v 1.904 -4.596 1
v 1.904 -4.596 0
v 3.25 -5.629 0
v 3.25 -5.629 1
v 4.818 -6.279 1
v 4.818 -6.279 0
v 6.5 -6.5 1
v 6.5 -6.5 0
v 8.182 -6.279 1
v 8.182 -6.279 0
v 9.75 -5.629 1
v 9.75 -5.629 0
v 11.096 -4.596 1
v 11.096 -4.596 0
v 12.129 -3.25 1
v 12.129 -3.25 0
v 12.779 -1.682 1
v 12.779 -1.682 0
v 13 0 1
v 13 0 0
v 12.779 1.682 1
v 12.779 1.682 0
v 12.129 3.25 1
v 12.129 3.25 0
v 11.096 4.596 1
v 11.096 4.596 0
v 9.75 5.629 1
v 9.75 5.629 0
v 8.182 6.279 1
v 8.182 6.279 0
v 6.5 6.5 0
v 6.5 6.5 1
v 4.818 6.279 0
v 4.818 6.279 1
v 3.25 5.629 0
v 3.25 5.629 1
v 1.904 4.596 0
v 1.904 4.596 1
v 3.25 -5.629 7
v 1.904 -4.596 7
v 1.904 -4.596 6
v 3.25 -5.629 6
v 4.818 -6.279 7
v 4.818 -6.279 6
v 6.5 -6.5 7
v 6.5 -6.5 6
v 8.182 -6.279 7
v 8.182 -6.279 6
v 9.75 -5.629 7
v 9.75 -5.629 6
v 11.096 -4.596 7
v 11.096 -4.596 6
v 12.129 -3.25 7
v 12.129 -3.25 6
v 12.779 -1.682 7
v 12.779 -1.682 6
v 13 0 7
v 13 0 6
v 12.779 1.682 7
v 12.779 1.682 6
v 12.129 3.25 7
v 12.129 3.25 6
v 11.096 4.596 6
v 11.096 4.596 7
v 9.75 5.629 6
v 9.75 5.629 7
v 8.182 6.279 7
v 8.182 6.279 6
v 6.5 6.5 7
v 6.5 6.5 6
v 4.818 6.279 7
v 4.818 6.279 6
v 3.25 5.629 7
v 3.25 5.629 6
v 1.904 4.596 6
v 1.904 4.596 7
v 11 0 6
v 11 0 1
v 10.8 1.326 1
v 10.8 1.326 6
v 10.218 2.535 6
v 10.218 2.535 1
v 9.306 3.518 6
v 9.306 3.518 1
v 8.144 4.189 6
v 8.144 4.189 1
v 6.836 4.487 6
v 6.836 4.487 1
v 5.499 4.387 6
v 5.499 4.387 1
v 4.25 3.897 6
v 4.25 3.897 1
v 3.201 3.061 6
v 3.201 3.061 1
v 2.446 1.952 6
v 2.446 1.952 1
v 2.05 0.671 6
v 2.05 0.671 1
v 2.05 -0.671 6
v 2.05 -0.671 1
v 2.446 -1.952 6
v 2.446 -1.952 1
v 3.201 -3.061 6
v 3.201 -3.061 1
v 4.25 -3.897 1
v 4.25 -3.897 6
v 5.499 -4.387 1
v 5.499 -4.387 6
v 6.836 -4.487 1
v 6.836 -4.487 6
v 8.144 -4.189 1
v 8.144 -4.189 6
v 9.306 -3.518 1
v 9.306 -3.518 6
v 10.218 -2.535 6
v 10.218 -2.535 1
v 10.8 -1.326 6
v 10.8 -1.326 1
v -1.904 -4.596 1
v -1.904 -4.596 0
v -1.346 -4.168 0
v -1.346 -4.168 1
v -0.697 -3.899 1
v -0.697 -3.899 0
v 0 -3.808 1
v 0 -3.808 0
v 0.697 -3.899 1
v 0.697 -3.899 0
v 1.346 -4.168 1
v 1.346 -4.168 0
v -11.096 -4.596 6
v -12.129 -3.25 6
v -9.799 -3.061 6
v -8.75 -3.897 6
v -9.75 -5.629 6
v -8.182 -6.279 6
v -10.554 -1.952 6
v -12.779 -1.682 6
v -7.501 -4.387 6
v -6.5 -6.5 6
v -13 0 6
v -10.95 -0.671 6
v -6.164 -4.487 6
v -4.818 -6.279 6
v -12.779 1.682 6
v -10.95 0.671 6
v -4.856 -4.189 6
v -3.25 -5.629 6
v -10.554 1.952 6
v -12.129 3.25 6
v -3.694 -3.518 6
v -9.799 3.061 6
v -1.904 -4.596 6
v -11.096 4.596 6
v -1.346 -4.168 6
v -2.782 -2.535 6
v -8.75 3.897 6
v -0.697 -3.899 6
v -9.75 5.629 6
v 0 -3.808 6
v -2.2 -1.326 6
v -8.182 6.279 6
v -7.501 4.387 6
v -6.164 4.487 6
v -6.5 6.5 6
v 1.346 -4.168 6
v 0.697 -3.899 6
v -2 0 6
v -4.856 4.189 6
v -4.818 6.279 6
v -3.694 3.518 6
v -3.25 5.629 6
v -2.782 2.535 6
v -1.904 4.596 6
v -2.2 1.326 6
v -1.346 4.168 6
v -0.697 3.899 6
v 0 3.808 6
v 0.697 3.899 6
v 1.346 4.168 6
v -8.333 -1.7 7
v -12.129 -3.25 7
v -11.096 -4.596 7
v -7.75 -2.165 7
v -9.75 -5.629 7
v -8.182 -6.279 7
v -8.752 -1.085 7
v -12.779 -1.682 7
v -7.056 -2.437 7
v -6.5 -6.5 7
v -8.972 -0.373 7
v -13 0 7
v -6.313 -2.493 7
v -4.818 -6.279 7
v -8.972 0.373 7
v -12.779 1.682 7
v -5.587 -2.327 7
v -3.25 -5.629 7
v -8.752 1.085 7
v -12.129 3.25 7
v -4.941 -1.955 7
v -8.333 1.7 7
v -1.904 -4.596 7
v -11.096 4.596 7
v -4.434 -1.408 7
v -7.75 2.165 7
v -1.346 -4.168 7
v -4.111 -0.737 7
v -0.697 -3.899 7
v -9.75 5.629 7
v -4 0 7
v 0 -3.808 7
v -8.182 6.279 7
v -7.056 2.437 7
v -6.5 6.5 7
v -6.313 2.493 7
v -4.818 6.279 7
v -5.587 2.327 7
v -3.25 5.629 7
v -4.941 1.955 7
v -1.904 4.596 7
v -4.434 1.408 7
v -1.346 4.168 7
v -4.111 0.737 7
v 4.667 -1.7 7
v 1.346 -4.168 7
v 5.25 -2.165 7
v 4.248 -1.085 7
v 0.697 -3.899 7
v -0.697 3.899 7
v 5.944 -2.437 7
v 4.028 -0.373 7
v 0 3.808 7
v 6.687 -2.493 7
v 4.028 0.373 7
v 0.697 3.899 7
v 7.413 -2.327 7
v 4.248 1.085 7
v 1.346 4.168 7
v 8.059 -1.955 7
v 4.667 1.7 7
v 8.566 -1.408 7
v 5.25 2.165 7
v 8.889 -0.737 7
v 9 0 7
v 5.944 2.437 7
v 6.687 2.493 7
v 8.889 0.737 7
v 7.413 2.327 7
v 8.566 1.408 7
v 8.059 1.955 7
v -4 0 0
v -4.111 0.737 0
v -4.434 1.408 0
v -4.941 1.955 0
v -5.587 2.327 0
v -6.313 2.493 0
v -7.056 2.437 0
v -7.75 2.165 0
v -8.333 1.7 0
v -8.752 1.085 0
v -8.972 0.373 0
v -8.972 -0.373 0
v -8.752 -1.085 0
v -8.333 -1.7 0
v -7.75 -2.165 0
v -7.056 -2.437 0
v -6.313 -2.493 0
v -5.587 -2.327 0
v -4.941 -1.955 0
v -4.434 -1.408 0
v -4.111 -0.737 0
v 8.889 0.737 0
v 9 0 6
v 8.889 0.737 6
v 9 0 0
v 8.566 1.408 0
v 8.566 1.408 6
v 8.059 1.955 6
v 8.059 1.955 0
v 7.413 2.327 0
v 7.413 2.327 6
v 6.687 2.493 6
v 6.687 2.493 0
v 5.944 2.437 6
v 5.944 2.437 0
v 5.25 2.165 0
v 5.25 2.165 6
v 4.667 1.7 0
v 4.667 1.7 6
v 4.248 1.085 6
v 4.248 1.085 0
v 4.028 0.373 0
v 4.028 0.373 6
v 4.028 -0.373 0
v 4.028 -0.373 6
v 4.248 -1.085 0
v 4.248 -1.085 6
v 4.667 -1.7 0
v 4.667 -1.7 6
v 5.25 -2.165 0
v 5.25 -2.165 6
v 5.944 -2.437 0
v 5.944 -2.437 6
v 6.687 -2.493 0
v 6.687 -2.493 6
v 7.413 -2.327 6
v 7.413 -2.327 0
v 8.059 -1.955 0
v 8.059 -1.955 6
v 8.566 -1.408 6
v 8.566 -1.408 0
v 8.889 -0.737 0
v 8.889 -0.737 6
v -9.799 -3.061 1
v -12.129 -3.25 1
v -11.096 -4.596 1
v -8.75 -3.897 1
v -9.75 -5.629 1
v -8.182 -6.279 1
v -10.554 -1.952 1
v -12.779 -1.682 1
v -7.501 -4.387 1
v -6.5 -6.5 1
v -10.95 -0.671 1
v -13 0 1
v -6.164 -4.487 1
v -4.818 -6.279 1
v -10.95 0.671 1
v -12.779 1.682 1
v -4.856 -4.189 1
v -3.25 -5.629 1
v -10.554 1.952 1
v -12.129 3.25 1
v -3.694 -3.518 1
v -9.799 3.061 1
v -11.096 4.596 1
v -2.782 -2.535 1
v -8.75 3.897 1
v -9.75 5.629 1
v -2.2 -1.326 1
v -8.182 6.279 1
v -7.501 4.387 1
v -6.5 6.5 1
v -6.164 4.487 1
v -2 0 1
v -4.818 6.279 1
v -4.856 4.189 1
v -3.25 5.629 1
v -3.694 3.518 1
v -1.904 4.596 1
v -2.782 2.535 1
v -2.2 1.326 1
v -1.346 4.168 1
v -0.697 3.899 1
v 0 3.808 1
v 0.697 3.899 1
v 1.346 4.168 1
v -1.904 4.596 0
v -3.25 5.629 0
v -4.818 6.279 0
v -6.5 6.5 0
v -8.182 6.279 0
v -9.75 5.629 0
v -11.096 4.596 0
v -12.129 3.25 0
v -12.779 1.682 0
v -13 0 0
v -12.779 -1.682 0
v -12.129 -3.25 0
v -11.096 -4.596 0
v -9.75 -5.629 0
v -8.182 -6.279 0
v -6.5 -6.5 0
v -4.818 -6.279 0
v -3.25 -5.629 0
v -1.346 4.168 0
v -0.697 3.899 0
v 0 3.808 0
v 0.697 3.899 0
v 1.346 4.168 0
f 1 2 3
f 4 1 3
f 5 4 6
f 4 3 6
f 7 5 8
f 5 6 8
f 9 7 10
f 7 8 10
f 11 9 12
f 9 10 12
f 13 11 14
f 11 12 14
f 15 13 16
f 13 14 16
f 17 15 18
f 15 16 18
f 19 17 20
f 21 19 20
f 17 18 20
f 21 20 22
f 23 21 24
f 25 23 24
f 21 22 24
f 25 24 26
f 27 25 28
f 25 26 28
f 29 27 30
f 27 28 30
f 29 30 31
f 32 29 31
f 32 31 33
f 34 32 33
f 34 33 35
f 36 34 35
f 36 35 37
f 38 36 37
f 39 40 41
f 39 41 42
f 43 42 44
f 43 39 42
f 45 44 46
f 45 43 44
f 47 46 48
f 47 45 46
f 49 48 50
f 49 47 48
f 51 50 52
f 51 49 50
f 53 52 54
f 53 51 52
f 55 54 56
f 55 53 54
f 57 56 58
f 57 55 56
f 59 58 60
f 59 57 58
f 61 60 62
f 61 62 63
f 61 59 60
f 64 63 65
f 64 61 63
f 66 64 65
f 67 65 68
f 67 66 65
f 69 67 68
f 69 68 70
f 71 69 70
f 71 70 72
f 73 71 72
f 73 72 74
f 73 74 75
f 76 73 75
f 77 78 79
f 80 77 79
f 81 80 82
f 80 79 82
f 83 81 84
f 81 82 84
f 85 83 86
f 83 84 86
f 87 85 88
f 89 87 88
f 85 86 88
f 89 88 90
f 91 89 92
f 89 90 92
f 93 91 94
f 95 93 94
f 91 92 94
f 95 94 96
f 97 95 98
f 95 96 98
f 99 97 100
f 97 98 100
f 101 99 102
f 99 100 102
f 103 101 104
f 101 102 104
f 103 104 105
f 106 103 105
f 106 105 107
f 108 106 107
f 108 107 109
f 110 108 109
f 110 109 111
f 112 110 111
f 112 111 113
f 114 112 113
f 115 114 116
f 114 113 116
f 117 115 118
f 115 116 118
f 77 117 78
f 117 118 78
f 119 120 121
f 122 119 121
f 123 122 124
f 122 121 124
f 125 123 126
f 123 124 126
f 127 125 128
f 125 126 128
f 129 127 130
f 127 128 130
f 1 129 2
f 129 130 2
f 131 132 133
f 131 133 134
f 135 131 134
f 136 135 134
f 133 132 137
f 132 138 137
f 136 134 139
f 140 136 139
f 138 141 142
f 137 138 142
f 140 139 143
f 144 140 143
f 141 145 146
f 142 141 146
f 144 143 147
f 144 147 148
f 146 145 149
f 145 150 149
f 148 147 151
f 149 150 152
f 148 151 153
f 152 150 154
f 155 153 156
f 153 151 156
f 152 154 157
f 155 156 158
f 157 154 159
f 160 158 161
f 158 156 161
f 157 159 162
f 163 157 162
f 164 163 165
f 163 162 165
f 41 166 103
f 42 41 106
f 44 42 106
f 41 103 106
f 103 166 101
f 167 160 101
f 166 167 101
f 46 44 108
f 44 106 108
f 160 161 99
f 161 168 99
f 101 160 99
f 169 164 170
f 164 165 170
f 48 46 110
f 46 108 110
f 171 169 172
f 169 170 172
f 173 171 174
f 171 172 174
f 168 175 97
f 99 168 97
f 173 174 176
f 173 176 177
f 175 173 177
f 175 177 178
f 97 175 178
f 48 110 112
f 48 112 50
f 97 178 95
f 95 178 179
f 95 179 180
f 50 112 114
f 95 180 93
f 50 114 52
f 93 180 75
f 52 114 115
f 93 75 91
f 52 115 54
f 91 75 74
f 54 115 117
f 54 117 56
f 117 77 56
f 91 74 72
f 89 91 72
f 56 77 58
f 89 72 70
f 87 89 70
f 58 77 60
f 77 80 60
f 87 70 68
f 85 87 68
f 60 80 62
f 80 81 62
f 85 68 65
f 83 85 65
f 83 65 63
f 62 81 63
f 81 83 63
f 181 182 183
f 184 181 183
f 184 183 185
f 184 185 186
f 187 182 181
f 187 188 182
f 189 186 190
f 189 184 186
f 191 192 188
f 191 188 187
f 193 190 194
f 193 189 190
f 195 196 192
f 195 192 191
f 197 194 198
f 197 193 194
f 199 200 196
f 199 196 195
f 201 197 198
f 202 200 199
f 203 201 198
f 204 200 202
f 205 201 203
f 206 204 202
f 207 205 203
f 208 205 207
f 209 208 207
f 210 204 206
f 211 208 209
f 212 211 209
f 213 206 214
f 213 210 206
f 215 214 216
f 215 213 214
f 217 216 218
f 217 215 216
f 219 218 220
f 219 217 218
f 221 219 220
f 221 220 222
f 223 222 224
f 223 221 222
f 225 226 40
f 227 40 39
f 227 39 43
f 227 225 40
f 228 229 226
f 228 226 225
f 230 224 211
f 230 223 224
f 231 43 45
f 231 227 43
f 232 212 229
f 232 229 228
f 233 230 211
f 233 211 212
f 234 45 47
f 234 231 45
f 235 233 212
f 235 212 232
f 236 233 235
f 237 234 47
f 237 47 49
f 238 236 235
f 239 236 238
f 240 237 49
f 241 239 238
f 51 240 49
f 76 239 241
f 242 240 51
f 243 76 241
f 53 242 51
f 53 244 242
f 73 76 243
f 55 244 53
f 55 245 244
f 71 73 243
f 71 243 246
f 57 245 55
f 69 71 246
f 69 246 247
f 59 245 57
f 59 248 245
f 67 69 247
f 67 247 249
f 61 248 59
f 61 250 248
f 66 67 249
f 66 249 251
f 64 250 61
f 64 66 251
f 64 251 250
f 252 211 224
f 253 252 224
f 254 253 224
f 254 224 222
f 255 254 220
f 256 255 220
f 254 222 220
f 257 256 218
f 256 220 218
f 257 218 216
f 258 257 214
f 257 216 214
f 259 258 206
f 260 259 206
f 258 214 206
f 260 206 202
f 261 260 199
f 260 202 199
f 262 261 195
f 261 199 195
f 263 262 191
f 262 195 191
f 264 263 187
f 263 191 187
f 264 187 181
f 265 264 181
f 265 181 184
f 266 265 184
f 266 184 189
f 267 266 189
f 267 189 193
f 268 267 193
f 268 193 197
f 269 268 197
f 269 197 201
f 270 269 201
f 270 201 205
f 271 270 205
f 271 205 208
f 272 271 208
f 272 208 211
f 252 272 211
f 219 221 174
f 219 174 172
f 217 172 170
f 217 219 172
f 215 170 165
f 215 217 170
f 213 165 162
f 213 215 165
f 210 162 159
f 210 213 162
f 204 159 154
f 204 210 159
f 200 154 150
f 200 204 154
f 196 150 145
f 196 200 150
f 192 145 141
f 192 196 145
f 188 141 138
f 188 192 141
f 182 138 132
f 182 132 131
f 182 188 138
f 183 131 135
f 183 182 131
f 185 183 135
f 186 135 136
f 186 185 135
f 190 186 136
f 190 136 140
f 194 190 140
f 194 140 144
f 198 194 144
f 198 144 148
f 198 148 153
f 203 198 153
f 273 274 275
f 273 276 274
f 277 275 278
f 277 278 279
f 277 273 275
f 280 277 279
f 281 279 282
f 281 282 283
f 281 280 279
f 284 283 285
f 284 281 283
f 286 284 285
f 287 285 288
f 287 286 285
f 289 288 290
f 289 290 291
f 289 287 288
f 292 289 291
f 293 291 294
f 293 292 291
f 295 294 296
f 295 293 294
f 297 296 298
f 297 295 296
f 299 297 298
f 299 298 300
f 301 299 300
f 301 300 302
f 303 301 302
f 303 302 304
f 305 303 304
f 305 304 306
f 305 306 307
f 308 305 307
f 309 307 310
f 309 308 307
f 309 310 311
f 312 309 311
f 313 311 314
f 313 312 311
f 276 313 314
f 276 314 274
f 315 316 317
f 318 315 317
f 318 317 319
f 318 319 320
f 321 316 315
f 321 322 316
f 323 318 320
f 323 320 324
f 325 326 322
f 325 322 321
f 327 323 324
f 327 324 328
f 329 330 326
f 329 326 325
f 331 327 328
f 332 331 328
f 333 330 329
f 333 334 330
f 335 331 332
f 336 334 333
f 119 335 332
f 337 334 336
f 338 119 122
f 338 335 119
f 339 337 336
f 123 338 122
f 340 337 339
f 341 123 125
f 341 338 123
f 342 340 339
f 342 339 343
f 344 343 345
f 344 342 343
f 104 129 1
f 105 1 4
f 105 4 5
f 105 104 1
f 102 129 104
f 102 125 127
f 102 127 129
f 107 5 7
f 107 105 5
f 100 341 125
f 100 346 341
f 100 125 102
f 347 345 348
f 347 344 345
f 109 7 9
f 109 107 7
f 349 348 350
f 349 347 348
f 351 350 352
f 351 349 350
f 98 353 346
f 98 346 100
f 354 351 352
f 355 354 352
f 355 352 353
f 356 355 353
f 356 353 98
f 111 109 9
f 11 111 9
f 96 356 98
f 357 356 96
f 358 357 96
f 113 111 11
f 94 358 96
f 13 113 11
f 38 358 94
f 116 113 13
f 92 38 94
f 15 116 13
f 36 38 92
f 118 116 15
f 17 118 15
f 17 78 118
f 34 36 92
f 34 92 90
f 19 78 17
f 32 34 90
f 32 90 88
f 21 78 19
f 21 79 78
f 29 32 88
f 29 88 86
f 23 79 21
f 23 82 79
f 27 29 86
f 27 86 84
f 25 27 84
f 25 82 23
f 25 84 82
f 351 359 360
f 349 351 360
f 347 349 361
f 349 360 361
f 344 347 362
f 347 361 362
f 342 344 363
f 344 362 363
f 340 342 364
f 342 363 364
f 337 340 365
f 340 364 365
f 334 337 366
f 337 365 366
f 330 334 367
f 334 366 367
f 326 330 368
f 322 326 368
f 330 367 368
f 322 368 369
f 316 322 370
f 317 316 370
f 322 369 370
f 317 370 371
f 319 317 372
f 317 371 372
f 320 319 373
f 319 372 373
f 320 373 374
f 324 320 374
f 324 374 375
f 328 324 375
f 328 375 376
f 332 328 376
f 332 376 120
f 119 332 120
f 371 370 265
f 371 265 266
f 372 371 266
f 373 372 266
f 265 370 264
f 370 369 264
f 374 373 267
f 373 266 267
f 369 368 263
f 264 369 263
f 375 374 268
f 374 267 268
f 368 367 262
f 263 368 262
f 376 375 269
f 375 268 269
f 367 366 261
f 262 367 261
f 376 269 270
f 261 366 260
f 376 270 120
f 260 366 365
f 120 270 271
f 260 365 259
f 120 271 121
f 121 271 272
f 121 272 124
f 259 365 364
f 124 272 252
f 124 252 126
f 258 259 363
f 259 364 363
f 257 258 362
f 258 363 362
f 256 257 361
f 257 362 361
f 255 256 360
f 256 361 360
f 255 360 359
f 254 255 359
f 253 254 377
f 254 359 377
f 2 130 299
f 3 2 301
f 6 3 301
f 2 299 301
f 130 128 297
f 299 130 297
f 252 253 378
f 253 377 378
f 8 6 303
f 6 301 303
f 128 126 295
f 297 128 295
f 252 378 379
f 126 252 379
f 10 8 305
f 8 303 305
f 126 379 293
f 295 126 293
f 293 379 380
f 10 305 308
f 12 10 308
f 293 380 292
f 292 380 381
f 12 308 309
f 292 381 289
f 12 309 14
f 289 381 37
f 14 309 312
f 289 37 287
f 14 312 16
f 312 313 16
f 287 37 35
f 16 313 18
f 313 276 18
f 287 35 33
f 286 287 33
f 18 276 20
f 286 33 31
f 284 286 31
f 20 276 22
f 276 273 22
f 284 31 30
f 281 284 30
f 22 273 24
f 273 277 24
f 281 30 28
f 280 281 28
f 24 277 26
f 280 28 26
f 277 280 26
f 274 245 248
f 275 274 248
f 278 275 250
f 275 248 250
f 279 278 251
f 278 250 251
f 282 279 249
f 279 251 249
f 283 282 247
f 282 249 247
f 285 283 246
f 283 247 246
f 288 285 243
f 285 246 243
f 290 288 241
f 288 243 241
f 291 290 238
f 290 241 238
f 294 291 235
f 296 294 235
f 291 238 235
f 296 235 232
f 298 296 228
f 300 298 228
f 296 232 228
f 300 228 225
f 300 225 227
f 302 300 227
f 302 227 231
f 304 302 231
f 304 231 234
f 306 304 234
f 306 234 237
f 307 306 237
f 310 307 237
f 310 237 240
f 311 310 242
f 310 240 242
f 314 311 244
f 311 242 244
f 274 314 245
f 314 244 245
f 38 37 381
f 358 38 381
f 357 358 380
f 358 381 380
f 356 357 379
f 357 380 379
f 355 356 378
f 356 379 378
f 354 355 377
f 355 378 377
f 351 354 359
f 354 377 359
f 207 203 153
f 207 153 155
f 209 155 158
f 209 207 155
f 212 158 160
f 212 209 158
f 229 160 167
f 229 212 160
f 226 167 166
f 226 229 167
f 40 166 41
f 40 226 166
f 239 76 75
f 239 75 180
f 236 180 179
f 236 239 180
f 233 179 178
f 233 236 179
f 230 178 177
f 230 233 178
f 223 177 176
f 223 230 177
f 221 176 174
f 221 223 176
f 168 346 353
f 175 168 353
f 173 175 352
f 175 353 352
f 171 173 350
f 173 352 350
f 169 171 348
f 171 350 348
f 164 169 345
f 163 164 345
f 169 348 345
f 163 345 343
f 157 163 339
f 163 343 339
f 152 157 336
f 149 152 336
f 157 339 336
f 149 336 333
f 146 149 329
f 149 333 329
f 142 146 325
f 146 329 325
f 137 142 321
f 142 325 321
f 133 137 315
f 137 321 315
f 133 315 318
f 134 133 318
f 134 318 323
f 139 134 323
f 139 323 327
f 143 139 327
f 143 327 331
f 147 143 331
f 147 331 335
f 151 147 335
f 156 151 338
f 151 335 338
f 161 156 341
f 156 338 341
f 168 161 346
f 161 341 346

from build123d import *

# Parameters (mm, degrees)
CROQUIS1_R              = 2.5
SALIENTE_EXTRUIR1_DEPTH = 1
CROQUIS2_R              = 4.5
CROQUIS2_R_2            = 2.5
SALIENTE_EXTRUIR2_DEPTH = 5


with BuildPart() as part:
    # Croquis1 → Saliente-Extruir1 (new body)
    with BuildSketch(Plane.XY):
        with BuildLine():
            ThreePointArc((-1.903805922, 4.596194078), (-13, 0), (-1.903805922, -4.596194078))
            ThreePointArc((-1.903805922, -4.596194078), (0, -3.807611845), (1.903805922, -4.596194078))
            ThreePointArc((1.903805922, -4.596194078), (13, 0), (1.903805922, 4.596194078))
            ThreePointArc((1.903805922, 4.596194078), (0, 3.807611845), (-1.903805922, 4.596194078))
        make_face()
        with Locations((-6.5, 0)):
            Circle(CROQUIS1_R, mode=Mode.SUBTRACT)
        with Locations((6.5, 0)):
            Circle(CROQUIS1_R, mode=Mode.SUBTRACT)
    saliente_extruir1 = extrude(amount=SALIENTE_EXTRUIR1_DEPTH)

    # Croquis2 → Saliente-Extruir2 (add)
    with BuildSketch(Plane.XY.offset(1)):
        with Locations((6.5, 0)):
            Circle(CROQUIS2_R)
        with Locations((6.5, 0)):
            Circle(CROQUIS2_R_2, mode=Mode.SUBTRACT)
        with Locations((-6.5, 0)):
            Circle(CROQUIS2_R)
        with Locations((-6.5, 0)):
            Circle(CROQUIS2_R_2, mode=Mode.SUBTRACT)
    extrude(amount=SALIENTE_EXTRUIR2_DEPTH)

    # Simetría1: Saliente-Extruir1 across plane
    add(saliente_extruir1.mirror(Plane.XY.offset(3.5)))


solid = part.part
